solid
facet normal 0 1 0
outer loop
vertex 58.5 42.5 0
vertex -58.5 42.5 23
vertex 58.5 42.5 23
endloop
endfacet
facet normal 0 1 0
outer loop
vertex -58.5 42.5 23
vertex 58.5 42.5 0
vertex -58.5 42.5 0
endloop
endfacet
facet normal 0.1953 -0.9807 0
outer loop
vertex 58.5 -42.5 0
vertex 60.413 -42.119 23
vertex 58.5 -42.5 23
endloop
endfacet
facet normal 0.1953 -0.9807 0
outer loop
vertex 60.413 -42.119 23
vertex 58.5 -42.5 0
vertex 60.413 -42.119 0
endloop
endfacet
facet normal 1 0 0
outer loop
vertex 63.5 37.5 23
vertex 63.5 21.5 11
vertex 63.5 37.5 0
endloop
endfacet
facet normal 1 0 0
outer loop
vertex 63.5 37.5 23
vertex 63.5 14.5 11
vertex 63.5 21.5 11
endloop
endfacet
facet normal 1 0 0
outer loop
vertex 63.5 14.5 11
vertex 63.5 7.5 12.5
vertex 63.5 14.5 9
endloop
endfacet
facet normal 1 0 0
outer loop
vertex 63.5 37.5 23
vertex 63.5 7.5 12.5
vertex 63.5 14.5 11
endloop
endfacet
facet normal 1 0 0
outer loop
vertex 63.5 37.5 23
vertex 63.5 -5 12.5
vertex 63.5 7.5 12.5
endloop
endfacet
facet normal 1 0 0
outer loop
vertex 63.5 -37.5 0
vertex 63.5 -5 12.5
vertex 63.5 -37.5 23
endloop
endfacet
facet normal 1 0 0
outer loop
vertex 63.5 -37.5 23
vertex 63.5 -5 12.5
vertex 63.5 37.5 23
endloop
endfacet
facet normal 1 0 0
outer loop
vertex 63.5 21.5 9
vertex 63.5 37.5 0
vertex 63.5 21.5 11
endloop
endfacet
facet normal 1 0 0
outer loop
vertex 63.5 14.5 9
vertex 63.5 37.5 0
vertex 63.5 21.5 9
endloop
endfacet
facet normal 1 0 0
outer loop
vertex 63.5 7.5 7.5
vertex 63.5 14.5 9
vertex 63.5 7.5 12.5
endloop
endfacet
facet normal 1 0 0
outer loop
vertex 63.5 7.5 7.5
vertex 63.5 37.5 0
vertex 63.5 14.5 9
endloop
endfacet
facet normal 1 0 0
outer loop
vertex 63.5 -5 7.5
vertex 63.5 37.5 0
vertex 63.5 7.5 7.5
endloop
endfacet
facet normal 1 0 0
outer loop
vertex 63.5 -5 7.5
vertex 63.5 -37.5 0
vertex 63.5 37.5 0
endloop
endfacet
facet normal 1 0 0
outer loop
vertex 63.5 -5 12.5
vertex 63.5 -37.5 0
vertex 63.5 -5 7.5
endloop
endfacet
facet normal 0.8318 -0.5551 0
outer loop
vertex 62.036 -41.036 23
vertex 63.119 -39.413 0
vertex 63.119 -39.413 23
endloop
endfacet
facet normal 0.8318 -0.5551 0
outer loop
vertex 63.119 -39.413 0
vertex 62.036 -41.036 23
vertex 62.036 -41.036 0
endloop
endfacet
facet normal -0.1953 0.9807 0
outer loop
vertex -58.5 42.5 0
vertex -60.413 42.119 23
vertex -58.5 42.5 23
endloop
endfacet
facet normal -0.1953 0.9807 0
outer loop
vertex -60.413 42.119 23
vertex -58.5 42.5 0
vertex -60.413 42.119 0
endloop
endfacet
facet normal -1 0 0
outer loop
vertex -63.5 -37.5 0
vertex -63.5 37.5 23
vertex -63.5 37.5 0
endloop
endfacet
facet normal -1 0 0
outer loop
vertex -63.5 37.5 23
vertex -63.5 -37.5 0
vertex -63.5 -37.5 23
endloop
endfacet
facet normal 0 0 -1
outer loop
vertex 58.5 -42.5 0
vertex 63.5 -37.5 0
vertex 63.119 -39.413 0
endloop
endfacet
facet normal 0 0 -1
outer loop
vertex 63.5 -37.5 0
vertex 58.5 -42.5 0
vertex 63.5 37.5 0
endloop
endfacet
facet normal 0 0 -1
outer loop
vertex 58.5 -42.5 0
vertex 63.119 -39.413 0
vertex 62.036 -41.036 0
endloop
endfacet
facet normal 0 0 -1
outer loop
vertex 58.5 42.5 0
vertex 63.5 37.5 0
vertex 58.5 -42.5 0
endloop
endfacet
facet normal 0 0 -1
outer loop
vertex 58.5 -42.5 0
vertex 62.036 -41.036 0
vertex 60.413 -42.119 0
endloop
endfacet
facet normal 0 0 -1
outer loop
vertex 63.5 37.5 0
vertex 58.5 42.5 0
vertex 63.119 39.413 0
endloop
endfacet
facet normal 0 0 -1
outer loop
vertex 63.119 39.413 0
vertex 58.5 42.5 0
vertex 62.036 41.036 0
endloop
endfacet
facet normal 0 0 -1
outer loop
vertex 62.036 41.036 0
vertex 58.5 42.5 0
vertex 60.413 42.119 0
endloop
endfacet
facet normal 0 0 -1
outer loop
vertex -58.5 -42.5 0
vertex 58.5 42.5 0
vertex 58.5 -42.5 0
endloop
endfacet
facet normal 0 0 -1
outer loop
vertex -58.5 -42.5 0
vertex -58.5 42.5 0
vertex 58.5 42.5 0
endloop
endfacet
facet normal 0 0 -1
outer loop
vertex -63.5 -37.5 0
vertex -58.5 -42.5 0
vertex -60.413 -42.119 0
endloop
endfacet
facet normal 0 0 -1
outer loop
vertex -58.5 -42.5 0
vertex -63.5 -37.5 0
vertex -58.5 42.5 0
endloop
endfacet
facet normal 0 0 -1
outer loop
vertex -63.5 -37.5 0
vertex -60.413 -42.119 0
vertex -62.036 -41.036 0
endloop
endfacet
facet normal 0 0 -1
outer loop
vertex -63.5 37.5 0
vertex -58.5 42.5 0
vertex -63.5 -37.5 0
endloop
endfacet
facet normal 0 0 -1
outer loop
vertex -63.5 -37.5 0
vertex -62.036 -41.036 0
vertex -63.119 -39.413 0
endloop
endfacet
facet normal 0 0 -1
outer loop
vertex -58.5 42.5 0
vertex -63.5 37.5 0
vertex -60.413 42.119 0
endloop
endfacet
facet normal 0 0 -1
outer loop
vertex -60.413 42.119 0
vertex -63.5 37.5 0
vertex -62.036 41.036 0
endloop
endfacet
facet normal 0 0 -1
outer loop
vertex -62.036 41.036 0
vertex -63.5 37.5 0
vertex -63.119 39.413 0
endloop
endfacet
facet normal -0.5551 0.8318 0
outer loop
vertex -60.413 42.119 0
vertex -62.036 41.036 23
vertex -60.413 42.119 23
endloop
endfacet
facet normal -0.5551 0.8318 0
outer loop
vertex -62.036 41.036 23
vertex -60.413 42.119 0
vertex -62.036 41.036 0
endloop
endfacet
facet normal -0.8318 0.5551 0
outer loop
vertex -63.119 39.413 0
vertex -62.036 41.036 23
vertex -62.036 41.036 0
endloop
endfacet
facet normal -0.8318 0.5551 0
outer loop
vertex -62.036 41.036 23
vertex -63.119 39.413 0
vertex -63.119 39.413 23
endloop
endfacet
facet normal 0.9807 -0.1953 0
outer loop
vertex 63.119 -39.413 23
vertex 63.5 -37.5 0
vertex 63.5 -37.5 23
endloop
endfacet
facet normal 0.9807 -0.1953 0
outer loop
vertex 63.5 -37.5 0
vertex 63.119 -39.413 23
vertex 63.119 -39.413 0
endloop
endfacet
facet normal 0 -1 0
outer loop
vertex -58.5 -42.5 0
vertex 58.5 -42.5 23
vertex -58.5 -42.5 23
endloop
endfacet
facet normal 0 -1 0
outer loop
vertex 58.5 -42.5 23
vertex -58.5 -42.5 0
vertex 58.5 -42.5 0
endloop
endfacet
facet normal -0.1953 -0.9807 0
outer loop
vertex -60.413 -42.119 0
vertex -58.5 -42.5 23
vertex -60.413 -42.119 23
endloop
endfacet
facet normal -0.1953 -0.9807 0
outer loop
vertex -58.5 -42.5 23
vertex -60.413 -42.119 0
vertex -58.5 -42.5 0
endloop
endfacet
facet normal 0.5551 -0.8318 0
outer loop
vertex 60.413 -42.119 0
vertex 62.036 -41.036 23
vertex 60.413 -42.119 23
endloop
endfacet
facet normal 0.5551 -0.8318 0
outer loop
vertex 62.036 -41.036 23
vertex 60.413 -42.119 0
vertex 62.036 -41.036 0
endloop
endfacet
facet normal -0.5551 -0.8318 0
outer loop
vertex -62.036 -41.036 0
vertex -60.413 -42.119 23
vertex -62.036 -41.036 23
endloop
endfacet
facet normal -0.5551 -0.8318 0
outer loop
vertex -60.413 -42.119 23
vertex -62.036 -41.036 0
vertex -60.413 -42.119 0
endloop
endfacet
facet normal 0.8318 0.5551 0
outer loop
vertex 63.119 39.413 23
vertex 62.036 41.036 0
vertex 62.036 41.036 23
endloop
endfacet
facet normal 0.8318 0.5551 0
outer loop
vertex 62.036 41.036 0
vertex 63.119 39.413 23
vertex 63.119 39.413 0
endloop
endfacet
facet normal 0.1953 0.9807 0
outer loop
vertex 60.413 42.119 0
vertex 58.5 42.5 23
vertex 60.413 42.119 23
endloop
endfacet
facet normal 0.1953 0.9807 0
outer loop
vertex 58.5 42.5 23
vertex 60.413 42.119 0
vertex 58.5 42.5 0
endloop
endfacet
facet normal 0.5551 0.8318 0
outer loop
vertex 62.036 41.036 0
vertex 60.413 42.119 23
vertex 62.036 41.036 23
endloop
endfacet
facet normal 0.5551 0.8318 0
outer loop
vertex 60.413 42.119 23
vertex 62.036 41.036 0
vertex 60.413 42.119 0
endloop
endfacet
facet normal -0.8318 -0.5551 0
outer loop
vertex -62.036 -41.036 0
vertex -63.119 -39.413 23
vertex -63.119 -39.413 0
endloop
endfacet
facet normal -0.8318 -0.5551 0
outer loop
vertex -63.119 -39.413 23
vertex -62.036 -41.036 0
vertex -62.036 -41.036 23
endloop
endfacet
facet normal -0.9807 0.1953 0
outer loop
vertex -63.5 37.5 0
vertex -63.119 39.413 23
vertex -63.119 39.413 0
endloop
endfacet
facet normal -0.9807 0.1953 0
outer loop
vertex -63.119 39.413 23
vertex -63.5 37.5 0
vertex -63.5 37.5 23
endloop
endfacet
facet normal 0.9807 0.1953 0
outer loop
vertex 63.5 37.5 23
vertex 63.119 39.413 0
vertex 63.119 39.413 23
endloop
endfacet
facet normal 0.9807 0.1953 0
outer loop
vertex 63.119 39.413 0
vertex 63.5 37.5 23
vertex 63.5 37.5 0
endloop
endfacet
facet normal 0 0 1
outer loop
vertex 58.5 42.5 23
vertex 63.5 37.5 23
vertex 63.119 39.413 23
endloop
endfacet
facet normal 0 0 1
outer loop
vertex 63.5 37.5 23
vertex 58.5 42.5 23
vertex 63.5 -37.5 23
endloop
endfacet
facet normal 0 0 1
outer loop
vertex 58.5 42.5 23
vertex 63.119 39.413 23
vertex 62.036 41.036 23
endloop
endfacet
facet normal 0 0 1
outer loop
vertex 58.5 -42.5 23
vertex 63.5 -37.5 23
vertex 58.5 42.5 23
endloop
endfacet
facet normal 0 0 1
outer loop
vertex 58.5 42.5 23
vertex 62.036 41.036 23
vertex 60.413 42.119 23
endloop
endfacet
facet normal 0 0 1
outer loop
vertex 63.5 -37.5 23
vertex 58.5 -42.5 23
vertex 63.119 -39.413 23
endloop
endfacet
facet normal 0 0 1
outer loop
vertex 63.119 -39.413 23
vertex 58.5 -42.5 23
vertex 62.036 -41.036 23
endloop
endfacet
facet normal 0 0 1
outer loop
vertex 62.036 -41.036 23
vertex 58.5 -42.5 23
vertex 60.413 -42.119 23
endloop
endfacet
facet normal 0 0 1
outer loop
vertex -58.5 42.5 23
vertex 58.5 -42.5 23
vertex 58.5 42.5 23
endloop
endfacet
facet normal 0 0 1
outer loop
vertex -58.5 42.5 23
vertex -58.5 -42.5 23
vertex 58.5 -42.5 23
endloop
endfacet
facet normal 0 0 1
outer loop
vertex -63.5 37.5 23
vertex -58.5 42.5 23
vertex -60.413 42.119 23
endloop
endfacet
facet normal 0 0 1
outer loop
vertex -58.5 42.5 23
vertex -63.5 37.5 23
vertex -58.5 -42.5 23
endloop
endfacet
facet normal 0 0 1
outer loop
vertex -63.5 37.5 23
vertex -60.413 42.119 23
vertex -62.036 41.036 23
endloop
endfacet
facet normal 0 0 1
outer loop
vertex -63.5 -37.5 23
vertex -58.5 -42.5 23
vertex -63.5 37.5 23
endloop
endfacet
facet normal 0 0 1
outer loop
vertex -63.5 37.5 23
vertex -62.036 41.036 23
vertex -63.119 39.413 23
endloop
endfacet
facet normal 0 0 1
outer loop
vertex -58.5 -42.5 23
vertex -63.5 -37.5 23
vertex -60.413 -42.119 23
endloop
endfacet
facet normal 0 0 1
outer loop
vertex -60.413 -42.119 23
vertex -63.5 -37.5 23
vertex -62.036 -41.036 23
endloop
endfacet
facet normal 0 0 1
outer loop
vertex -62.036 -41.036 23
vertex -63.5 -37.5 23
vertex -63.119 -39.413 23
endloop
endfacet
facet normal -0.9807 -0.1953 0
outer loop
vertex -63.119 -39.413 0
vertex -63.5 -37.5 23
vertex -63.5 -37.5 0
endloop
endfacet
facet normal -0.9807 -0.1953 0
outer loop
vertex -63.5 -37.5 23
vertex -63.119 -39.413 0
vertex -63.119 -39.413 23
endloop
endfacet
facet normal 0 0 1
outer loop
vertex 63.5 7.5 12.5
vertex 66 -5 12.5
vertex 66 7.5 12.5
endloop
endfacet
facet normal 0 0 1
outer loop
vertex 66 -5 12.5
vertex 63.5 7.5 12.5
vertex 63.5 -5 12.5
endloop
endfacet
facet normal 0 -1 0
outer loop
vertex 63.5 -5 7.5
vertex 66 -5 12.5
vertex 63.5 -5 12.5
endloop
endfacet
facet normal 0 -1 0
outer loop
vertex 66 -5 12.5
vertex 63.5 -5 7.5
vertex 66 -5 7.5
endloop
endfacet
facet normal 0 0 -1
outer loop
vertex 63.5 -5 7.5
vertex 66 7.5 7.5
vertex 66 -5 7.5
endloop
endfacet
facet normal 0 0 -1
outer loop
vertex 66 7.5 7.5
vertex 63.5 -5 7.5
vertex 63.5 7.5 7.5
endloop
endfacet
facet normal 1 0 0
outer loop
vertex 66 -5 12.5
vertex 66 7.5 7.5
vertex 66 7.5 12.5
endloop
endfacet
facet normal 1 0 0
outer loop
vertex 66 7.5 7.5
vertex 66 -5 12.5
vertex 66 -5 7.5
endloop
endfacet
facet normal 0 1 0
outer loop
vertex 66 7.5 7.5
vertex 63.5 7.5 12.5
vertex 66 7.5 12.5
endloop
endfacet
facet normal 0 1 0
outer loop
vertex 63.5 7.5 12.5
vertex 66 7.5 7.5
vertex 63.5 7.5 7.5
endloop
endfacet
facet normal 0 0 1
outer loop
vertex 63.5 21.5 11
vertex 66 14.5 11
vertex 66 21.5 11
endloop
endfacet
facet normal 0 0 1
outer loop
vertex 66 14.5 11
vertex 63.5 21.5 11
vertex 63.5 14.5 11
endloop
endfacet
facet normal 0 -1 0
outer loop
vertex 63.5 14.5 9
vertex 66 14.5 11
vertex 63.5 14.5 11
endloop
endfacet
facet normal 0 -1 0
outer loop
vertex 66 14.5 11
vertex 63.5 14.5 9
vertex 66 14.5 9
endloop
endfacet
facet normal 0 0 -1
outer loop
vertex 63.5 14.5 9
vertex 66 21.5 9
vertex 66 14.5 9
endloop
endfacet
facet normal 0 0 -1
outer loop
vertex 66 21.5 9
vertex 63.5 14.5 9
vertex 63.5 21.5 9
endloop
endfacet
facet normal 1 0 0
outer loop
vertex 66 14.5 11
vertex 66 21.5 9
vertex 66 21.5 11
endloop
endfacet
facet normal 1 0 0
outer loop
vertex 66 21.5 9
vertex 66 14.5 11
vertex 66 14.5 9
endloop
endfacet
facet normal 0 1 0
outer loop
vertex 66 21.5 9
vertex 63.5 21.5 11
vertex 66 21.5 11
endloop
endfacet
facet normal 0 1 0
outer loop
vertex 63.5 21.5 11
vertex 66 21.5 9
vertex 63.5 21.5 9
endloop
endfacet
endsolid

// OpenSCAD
// battery dimensions
wide = 75;
long = 117;
thick = 23;

// USB out
usb_w = 12.5;
usb_h = 5;
usb_d = 5;

// micro USB in
m_usb_w = 7;
m_usb_h = 2;

points = [[0,0,0], [0,wide,0], [long,0,0], [long,wide,0]];
fillet = 5;
 
module battery(points, radius, height){
    union() {
        // battery enclosure
        translate([-(long/2),-(wide/2),0])
        hull(){
            for (p = points){
                translate(p) cylinder(r=radius, h=height);
            }
        }
        // USB out
        translate([(long/2+usb_d),1.25,10])
        rotate([0,0,90])
        cube([usb_w, usb_d, usb_h], center = true);
        // micro USB in
        translate([(long/2+usb_d),18,10])
        rotate([0,0,90])
        cube([m_usb_w, usb_d, m_usb_h], center = true);
    }
}

battery(points, fillet, thick);
